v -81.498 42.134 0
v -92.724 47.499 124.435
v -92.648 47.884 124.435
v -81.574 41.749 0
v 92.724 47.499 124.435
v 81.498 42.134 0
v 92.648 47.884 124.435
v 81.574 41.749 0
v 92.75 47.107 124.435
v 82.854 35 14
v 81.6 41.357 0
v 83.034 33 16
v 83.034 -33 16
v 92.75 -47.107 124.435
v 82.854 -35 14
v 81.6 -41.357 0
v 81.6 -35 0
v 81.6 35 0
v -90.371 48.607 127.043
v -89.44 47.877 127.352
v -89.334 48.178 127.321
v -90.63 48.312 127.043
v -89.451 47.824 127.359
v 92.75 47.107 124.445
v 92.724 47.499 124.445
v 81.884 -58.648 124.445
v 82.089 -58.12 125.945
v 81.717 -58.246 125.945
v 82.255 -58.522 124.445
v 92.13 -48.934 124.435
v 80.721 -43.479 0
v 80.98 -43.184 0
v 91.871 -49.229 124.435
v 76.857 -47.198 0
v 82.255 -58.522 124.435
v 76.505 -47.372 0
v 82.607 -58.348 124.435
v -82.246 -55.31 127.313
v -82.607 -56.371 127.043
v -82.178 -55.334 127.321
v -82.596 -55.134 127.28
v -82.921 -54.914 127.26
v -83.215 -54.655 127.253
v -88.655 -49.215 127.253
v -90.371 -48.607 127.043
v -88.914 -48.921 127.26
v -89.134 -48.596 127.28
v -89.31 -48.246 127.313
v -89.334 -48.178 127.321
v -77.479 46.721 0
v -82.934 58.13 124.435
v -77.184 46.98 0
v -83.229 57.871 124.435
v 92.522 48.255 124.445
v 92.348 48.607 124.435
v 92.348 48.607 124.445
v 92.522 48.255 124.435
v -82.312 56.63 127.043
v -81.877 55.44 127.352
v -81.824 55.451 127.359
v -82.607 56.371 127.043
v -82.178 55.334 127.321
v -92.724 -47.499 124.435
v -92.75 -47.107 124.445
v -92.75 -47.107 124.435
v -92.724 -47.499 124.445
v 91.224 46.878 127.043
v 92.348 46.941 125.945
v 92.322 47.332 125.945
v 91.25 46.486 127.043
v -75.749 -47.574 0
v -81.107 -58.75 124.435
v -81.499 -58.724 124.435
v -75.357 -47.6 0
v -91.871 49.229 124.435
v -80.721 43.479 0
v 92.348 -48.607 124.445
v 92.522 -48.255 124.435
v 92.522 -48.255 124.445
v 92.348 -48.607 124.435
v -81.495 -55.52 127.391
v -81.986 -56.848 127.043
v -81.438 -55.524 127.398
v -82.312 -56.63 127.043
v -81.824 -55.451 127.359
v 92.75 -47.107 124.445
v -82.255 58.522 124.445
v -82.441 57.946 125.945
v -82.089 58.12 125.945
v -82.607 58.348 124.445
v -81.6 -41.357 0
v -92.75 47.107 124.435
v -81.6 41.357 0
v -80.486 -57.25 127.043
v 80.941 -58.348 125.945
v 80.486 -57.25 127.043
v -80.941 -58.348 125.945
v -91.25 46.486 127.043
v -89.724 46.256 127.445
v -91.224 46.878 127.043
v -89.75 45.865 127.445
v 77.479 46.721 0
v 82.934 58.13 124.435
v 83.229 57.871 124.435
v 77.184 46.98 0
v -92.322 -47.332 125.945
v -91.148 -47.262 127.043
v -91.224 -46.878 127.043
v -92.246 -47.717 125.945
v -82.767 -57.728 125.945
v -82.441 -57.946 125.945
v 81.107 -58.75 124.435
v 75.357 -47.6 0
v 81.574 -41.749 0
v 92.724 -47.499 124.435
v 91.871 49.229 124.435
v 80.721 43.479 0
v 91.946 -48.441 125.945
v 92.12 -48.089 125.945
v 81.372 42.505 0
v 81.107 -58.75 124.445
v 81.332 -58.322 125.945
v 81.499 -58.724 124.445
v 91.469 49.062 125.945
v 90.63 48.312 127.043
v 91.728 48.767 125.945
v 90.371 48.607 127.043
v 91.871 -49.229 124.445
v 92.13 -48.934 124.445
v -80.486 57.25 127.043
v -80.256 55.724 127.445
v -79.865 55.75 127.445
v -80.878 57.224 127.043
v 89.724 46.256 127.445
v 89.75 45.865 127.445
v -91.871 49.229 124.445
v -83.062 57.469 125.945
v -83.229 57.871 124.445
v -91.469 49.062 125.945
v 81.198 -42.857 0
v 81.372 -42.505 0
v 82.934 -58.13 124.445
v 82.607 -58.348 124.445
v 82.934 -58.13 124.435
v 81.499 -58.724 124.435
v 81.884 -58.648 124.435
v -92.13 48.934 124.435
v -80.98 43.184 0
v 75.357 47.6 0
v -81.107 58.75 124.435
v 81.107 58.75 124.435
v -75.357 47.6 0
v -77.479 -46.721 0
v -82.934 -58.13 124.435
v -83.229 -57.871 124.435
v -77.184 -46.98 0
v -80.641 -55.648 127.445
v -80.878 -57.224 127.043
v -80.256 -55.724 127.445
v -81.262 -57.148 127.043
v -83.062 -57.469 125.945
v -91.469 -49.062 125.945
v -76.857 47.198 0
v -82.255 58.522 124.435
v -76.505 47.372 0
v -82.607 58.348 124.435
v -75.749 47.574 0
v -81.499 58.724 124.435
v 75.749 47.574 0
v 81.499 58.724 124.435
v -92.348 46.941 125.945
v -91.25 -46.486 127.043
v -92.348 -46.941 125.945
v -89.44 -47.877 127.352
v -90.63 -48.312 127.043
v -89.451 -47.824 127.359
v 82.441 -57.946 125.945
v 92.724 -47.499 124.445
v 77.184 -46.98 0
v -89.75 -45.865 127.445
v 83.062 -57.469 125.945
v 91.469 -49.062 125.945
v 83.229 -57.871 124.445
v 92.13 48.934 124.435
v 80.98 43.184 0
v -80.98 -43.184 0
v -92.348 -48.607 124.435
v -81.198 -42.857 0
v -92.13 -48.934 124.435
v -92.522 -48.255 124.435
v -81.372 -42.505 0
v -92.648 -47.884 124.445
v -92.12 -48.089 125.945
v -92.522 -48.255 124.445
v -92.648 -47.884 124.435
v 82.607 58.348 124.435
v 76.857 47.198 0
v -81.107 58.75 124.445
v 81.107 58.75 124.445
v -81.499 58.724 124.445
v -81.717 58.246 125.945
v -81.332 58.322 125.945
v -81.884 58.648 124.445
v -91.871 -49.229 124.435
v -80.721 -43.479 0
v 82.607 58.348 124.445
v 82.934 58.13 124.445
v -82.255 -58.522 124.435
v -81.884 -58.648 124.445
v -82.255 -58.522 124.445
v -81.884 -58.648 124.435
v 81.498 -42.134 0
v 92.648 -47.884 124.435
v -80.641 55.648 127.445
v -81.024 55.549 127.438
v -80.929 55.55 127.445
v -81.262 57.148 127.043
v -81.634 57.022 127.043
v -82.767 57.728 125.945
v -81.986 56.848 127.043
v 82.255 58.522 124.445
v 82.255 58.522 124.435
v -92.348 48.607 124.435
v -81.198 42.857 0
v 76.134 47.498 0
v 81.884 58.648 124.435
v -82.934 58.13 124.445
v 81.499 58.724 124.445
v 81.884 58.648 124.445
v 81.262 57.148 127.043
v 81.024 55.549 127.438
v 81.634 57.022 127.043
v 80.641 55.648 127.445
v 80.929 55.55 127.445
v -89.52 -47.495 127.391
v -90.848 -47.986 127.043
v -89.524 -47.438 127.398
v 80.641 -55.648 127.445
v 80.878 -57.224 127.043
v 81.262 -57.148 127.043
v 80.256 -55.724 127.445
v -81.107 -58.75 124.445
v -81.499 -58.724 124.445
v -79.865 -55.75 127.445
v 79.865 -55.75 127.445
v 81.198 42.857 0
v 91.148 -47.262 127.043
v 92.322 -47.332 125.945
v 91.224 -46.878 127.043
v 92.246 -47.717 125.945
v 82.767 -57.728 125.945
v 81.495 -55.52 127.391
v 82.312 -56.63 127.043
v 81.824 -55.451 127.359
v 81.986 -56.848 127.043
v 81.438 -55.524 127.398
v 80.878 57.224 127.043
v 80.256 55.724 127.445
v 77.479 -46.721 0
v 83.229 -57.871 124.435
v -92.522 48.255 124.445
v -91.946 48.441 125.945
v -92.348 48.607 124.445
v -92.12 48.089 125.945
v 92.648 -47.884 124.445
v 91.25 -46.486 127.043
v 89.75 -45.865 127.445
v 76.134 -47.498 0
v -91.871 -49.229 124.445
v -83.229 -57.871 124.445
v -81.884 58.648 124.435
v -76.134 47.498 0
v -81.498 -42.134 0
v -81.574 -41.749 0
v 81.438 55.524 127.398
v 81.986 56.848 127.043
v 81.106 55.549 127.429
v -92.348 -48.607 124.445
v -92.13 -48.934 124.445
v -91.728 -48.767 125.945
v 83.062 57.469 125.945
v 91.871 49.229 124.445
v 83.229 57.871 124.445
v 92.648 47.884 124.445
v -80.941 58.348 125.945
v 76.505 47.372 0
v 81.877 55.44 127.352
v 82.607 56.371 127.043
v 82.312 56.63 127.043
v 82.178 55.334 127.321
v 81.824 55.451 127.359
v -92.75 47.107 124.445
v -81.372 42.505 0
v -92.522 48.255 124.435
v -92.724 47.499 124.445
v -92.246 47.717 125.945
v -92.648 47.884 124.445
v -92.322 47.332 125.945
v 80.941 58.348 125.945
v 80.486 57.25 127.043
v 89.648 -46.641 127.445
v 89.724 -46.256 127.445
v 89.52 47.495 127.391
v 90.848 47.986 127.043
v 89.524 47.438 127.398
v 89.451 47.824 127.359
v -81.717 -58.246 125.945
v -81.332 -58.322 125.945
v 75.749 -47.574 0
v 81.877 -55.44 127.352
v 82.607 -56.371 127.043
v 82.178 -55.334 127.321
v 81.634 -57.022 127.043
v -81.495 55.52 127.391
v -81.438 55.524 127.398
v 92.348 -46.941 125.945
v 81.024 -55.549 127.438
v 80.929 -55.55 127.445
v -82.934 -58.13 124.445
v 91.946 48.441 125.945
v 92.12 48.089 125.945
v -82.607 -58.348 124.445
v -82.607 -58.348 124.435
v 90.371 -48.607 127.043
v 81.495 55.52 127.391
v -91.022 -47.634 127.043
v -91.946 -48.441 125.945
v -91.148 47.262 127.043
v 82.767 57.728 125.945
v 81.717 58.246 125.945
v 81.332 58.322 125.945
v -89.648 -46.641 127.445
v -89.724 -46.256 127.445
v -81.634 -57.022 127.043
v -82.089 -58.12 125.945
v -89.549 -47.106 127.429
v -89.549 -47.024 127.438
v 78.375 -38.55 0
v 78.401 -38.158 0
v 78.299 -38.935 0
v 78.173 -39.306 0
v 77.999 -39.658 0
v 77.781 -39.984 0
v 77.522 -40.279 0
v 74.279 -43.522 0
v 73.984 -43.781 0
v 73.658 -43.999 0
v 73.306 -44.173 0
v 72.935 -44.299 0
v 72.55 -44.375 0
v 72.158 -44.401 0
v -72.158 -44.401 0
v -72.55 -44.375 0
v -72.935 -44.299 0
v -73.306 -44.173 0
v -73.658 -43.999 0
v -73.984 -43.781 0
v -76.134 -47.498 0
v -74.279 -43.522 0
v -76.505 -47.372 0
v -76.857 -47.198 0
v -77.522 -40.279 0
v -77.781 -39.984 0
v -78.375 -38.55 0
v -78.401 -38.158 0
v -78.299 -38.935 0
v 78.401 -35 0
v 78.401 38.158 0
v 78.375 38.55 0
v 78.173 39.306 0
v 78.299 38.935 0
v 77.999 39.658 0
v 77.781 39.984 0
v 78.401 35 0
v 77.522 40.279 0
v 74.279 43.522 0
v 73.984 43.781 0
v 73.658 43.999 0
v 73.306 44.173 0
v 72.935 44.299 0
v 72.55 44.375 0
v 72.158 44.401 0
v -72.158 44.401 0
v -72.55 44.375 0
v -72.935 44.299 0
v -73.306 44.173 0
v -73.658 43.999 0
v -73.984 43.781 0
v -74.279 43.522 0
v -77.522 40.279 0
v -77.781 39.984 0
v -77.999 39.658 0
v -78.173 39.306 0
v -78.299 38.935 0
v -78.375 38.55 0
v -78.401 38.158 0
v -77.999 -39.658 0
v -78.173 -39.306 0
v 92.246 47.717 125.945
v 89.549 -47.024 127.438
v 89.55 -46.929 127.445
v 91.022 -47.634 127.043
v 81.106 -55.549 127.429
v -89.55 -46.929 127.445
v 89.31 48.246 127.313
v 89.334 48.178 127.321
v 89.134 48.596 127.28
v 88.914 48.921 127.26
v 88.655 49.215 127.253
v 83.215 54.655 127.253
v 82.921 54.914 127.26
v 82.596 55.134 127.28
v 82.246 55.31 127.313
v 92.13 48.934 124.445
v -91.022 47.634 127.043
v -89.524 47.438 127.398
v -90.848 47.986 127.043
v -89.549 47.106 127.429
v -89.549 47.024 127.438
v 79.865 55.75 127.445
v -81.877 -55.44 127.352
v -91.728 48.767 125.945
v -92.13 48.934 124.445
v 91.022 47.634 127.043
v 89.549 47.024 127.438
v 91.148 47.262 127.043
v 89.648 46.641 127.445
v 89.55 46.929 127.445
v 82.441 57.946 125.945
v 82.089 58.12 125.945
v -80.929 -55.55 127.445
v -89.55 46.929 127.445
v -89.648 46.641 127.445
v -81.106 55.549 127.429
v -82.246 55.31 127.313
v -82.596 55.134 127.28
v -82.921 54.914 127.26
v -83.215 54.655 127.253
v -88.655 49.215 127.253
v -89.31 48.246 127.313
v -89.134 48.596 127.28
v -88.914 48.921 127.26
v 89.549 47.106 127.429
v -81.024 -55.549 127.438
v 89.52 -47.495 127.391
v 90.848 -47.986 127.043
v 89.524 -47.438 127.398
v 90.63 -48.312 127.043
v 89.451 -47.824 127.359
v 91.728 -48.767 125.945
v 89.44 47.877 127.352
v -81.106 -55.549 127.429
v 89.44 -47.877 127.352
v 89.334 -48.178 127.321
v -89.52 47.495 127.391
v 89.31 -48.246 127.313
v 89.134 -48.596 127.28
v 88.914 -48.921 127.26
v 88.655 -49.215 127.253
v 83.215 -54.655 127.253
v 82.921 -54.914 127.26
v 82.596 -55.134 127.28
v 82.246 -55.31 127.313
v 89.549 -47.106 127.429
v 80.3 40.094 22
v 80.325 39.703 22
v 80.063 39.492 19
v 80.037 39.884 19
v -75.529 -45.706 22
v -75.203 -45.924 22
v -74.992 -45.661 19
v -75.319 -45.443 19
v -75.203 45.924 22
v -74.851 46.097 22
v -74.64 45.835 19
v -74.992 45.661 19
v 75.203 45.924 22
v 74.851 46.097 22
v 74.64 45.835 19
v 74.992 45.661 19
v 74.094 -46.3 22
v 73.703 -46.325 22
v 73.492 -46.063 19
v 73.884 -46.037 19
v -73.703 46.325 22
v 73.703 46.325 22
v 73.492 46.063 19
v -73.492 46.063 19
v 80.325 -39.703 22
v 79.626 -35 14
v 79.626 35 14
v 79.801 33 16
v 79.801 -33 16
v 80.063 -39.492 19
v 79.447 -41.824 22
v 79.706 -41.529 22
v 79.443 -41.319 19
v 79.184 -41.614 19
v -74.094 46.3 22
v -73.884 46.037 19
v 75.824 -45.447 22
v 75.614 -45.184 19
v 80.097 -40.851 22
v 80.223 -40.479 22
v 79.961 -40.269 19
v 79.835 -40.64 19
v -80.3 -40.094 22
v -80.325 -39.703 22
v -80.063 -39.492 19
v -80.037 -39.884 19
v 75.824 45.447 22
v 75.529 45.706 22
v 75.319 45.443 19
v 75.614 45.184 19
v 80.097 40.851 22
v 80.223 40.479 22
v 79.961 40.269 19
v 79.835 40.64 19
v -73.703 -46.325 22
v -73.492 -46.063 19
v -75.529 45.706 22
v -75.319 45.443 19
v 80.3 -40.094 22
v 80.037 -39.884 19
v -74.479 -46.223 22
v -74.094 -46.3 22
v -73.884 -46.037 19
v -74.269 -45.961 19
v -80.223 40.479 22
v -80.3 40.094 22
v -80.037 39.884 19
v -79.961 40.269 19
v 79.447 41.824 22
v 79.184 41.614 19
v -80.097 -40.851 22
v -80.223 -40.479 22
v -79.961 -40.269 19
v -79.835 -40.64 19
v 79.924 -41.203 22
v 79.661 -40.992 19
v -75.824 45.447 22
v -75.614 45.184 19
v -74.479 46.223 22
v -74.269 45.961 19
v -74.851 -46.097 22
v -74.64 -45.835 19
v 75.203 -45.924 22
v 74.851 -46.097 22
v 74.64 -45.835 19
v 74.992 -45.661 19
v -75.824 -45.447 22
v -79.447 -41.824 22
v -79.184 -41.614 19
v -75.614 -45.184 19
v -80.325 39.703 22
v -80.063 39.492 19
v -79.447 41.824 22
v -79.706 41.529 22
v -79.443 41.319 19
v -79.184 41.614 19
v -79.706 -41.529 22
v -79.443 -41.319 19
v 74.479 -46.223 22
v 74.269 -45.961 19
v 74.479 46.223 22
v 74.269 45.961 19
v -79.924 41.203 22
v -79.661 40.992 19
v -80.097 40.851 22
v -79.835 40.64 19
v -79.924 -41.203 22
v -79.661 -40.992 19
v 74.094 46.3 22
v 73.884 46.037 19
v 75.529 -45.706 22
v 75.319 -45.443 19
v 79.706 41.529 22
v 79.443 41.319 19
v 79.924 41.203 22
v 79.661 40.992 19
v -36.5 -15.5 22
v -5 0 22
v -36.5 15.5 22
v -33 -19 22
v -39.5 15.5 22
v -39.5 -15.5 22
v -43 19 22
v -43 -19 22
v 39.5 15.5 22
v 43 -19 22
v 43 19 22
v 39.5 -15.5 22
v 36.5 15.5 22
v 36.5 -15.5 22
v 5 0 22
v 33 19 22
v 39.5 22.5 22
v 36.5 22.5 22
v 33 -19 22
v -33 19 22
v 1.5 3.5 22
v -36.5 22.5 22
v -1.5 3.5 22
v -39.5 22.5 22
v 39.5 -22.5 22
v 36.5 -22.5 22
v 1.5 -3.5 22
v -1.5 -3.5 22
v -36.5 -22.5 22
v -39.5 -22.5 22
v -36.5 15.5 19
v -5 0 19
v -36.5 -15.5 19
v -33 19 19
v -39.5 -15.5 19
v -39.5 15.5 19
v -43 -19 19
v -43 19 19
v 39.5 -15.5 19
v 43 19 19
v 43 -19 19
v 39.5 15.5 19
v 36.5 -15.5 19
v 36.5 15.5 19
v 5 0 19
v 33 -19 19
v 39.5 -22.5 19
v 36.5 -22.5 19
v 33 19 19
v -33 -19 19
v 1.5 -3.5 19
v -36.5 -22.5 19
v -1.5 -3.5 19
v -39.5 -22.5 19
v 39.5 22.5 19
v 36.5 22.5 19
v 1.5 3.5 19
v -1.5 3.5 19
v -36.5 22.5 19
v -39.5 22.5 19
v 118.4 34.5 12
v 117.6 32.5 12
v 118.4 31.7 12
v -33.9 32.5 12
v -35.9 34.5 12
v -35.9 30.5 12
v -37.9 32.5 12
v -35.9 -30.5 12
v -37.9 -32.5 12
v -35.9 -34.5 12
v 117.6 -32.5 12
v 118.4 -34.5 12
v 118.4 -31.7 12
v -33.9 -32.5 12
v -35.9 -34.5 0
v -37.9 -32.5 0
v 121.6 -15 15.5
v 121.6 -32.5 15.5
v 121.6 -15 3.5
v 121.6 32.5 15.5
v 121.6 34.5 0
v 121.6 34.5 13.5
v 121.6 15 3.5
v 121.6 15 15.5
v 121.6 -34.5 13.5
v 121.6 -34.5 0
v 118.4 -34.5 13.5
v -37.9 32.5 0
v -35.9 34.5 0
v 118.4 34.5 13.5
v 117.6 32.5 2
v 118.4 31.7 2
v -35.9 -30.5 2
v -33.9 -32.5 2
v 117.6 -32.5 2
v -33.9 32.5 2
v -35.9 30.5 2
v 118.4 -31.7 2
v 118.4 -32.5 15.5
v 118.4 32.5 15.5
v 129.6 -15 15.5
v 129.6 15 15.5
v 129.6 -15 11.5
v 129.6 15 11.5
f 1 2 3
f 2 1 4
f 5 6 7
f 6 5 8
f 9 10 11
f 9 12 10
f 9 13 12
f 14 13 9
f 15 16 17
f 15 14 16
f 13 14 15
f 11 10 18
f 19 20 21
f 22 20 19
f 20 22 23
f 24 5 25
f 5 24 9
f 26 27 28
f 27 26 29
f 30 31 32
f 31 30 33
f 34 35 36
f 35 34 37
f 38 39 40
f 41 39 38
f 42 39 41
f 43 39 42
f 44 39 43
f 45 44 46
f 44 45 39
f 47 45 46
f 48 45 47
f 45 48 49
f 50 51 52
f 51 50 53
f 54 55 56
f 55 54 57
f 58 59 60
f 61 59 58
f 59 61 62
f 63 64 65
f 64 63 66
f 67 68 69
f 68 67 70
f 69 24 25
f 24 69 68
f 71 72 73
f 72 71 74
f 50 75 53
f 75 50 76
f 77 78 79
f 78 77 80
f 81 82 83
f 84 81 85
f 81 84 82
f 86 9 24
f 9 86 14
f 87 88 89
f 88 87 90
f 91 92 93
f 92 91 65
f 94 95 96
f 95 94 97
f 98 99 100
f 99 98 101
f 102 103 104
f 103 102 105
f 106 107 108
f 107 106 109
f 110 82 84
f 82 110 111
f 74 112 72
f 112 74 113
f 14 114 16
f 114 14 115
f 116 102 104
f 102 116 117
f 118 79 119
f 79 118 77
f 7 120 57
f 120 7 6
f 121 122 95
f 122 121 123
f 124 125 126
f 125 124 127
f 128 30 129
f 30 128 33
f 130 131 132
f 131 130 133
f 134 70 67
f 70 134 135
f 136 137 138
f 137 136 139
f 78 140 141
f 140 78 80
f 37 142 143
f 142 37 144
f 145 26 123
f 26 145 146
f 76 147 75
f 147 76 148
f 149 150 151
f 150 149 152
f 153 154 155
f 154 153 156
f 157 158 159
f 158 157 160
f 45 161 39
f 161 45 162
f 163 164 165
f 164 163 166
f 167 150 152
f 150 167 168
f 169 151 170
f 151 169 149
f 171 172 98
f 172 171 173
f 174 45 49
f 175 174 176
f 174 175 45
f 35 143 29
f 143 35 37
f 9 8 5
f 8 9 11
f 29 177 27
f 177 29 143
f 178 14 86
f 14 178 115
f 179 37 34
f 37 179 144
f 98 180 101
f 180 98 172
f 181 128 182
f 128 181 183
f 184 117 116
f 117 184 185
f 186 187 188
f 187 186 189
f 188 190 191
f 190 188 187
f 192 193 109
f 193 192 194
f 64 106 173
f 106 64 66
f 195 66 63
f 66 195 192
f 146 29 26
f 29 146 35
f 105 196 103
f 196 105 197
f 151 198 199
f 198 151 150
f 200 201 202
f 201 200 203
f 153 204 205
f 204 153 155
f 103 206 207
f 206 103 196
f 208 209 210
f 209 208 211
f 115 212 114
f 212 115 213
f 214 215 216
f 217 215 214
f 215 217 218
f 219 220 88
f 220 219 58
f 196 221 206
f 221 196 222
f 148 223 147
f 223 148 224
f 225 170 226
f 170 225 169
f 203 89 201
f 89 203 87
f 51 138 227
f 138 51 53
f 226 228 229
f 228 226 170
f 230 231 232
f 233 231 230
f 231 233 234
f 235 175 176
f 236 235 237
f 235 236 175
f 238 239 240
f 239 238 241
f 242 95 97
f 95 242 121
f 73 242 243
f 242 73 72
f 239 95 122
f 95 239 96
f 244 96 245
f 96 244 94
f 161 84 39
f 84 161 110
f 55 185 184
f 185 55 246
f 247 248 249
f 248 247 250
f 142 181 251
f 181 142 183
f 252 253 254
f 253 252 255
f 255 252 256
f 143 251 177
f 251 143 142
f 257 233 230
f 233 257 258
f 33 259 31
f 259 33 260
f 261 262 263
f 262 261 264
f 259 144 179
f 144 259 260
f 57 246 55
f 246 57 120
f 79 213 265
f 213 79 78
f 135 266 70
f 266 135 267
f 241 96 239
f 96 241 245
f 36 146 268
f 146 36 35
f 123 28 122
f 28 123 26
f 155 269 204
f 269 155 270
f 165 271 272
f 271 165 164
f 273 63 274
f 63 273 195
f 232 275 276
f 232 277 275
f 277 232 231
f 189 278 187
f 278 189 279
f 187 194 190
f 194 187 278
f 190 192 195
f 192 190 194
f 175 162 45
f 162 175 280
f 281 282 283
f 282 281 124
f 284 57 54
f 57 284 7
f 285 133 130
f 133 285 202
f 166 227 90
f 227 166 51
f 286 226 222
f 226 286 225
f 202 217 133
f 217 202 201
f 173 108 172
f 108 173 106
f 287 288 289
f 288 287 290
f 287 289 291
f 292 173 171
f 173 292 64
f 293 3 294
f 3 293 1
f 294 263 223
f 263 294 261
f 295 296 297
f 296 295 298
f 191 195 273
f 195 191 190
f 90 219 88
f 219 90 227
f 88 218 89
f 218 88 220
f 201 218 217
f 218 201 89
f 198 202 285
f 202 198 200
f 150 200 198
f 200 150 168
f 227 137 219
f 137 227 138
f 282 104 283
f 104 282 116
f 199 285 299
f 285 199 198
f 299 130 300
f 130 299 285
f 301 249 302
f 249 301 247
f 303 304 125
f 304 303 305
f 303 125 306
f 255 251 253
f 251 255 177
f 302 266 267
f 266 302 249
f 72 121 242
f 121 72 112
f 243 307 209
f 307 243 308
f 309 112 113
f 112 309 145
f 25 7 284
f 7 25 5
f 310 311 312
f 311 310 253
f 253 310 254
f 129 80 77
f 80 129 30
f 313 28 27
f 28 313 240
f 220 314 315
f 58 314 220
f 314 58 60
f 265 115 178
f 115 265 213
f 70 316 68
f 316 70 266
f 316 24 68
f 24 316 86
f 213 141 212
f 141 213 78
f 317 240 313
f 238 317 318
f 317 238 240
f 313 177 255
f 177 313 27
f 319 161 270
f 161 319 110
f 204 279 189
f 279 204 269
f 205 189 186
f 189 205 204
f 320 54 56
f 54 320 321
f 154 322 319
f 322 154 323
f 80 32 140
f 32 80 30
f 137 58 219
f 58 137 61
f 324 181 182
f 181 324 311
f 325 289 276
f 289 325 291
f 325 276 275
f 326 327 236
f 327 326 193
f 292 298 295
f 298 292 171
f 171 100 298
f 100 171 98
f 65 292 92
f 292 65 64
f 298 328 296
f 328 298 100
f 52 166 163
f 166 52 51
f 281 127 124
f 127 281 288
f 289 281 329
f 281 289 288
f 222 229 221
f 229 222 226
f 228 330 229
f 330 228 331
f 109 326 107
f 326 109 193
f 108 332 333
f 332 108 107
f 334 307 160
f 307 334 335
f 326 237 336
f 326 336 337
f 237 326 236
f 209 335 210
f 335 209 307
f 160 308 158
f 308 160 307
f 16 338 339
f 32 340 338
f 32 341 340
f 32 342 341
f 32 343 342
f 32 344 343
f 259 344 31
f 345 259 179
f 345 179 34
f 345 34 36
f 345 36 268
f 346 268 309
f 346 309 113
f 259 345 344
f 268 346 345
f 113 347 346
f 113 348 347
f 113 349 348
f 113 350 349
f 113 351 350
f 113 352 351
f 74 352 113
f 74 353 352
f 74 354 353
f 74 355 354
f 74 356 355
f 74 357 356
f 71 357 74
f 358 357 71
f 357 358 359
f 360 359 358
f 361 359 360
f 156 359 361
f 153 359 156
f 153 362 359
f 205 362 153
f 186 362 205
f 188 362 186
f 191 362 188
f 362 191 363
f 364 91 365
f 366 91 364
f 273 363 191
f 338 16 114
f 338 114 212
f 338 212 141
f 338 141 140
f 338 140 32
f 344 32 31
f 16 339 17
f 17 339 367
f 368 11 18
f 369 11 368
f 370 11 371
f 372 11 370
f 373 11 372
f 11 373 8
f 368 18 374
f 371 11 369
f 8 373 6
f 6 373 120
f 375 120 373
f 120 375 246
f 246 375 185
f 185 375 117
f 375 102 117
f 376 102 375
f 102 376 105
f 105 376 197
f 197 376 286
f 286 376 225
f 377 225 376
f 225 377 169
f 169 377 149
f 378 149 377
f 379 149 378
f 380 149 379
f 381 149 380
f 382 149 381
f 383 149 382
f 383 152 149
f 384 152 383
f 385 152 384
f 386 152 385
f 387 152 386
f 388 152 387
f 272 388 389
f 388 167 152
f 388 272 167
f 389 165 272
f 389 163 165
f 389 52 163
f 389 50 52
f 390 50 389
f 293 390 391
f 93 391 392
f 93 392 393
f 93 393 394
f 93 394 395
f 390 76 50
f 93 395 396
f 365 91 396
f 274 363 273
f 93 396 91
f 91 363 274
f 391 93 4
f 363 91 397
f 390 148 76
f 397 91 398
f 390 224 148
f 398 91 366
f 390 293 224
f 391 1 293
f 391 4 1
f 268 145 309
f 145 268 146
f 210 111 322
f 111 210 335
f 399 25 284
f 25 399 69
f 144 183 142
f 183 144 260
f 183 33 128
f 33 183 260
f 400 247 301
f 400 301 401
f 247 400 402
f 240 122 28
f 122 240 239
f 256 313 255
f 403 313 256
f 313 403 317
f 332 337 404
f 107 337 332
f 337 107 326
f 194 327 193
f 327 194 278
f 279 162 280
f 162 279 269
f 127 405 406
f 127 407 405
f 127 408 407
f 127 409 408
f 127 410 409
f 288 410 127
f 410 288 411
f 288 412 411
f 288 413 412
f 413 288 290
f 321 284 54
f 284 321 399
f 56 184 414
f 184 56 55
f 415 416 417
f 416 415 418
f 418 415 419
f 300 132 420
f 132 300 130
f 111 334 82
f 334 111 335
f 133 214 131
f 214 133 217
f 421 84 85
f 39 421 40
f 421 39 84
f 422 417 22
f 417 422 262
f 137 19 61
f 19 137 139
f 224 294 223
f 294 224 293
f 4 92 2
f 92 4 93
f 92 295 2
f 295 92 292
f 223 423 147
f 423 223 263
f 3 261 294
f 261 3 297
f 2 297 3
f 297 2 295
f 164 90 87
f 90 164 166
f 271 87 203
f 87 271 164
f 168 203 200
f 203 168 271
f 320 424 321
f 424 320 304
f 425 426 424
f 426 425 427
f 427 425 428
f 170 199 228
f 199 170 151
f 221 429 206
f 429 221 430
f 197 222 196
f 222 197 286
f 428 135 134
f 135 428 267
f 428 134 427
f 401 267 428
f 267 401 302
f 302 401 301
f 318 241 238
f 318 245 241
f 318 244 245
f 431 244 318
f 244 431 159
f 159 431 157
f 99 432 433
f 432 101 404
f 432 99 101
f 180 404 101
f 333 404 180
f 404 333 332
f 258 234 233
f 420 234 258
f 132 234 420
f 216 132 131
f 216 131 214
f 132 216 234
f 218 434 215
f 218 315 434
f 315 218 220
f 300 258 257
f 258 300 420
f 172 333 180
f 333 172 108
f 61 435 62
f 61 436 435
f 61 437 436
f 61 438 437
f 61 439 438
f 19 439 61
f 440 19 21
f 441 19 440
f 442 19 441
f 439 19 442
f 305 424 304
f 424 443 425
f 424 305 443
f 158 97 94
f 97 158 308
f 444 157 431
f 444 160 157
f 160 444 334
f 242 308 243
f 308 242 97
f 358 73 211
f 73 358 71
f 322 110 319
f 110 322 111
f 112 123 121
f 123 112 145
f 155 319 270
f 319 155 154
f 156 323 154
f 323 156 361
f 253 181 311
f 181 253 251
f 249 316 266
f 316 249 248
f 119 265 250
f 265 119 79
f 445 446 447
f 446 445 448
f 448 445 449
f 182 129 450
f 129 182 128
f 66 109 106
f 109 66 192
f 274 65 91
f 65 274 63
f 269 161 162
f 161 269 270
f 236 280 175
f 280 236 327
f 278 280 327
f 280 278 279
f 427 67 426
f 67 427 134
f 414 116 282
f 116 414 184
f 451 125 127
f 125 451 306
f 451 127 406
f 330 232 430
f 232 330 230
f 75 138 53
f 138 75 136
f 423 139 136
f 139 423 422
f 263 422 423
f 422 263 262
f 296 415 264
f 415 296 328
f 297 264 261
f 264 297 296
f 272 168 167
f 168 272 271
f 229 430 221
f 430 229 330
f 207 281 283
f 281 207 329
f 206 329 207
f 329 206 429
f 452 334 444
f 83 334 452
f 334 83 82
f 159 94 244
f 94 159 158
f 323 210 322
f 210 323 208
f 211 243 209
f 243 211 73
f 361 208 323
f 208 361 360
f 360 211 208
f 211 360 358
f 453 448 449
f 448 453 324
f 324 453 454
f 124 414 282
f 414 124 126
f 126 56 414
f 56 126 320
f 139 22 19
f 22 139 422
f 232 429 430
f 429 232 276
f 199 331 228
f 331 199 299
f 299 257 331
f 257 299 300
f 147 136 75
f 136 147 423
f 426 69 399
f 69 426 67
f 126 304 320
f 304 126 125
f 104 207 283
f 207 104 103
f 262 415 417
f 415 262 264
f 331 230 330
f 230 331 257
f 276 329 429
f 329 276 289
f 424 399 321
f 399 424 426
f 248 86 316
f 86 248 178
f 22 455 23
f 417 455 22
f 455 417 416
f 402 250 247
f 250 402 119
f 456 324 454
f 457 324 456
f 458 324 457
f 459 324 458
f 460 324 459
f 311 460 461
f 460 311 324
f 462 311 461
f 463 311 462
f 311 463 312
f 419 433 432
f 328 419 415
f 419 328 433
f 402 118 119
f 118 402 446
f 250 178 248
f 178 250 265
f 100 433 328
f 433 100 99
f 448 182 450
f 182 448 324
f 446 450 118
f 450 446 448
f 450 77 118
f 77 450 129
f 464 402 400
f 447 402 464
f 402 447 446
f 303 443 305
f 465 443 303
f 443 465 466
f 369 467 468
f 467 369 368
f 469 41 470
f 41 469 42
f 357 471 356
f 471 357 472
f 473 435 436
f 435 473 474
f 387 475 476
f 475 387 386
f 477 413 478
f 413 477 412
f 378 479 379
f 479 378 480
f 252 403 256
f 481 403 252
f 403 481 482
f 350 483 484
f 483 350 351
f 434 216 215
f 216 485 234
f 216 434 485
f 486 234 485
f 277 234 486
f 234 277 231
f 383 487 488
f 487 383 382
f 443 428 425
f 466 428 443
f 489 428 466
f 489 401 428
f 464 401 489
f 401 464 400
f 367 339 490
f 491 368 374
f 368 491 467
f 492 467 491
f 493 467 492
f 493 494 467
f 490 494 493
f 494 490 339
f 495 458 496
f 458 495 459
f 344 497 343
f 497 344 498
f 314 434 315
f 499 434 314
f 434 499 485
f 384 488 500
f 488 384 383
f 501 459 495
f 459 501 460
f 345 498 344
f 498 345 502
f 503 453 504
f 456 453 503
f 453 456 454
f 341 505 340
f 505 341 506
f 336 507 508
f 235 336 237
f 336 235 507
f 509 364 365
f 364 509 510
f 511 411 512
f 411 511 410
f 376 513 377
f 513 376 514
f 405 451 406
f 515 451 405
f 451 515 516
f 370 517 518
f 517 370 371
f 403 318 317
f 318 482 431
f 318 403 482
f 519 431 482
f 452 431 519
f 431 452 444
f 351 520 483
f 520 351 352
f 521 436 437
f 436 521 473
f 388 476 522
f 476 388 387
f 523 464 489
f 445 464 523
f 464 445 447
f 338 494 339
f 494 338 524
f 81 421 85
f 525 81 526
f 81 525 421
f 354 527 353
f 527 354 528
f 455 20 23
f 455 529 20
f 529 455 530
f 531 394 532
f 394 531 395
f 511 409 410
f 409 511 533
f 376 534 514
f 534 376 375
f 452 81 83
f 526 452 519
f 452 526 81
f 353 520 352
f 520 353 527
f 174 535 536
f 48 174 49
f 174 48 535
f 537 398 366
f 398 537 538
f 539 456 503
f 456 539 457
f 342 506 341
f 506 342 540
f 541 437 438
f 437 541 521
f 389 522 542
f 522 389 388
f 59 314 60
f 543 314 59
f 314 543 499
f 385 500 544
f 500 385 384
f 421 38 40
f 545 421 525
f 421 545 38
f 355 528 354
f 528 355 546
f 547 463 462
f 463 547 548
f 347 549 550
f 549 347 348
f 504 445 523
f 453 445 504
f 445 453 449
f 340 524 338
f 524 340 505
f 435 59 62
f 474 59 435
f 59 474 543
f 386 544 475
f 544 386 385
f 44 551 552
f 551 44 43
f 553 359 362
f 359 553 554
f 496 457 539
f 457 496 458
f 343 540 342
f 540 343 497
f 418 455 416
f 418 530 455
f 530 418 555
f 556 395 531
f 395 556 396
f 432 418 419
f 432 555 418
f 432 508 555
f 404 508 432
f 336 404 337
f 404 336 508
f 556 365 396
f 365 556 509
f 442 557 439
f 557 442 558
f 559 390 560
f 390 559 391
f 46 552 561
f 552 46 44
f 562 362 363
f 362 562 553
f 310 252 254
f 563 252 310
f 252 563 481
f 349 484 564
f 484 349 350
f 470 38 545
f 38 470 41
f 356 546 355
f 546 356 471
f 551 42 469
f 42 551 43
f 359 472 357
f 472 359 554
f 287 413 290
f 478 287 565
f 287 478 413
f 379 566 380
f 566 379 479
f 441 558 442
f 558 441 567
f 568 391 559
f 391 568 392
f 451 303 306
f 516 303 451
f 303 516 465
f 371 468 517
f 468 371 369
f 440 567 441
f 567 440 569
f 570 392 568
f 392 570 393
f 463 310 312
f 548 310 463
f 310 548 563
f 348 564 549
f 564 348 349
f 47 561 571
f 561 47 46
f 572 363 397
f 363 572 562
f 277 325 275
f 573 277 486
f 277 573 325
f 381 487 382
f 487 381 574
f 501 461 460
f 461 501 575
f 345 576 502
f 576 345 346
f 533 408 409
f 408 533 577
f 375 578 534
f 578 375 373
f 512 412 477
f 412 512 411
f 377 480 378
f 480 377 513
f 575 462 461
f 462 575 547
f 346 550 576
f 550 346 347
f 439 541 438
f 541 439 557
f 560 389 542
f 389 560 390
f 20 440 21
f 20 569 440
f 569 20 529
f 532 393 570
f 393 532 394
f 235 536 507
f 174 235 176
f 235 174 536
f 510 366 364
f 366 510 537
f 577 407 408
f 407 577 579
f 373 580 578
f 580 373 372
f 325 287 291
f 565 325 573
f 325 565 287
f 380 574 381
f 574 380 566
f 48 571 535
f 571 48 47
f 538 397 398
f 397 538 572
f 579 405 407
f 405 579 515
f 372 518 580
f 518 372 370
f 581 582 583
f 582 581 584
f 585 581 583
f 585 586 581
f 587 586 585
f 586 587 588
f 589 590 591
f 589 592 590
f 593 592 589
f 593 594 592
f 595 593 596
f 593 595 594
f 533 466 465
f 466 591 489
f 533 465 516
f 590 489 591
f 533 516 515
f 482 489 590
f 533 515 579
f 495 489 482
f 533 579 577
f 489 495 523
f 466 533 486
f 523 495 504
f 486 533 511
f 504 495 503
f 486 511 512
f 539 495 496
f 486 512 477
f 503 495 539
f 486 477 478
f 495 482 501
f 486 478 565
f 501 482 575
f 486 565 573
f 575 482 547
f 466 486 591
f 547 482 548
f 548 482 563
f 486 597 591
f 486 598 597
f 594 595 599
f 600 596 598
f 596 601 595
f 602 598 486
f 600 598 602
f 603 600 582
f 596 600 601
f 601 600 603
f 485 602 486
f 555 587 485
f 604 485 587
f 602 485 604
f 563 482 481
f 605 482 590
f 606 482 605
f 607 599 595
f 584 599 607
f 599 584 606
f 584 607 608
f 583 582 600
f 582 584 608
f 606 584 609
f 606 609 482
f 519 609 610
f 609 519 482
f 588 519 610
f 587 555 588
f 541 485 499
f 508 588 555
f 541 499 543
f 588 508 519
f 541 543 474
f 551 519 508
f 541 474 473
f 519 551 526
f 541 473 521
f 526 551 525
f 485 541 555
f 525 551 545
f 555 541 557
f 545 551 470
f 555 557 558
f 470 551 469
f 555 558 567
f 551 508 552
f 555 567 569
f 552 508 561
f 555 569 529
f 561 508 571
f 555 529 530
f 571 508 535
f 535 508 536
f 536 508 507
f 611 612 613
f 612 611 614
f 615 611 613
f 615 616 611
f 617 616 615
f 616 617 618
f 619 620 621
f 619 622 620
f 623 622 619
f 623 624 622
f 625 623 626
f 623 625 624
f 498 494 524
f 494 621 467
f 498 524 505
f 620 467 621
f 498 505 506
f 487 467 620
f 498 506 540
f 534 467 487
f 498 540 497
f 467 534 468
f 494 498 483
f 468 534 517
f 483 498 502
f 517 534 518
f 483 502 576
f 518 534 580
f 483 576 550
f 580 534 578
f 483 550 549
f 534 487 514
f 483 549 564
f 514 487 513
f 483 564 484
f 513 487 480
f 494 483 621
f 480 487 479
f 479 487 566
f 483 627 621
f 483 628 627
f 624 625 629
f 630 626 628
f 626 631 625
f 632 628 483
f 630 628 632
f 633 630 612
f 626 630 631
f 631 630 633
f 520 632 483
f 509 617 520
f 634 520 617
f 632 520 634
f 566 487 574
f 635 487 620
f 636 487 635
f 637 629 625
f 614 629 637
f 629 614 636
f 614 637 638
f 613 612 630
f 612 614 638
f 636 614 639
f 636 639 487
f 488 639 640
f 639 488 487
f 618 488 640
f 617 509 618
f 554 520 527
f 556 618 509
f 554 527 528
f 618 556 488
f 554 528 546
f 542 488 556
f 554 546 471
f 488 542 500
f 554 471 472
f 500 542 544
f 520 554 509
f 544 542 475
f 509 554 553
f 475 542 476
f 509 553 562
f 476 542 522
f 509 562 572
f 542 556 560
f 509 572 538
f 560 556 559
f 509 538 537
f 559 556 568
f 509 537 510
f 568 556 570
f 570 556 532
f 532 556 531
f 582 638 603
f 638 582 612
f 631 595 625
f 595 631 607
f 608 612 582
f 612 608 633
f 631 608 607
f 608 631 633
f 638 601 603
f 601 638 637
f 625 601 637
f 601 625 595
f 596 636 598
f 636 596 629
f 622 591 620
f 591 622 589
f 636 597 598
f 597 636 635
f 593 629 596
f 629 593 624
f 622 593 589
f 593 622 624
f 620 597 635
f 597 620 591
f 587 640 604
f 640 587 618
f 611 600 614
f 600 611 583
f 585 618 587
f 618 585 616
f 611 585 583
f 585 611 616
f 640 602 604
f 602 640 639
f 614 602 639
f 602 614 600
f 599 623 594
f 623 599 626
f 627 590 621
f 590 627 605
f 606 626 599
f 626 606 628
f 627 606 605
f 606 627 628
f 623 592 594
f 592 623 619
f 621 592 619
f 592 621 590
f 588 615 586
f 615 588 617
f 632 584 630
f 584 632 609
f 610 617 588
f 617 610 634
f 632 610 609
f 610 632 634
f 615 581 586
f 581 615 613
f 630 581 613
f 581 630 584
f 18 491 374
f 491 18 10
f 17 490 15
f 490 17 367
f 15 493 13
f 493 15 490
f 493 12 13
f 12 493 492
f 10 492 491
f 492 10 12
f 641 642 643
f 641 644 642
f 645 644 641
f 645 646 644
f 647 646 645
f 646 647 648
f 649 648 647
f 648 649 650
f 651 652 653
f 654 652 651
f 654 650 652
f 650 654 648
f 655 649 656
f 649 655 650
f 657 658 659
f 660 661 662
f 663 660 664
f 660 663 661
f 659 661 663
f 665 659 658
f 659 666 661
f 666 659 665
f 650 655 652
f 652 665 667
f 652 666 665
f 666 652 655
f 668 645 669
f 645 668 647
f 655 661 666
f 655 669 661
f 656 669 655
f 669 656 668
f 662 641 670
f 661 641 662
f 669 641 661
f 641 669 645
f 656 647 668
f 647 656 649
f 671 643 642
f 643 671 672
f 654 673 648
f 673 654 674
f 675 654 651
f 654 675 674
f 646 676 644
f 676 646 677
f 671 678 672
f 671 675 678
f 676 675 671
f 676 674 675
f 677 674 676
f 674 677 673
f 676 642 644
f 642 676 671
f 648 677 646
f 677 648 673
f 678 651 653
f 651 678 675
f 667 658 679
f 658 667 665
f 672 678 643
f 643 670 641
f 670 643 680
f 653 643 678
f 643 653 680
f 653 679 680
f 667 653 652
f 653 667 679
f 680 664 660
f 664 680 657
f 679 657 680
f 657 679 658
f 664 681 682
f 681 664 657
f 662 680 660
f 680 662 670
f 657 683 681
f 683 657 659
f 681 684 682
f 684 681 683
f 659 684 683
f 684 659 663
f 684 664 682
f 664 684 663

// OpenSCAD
// Marsh repot liner — rebuilt from "Marsh repot - FIX flat rim setback.step"
// (two-body Fusion export, 2026-07-10) plus the user's section screenshots.
// Dimensions taken from per-body vertex extraction; see comments.
//
// TWO PARTS: set `part` to "pot", "tray", or "all" (assembly preview;
// `pullout` slides the tray out along +X for illustration).
//
// PRINT ORIENTATION (pot): on its BACK face — the +X end wall — rotated
// (90 - draft) about Y so that wall lies flat: 85deg at the current 5deg
// draft. Hanging tension then runs along layer planes [25]. The drawer
// slot lives in that same wall, so in use it faces the wall/shelf and
// the pot reads as an unbroken solid from the front and sides.
// The tray prints as modelled: flat on the bed, basin up.
//
// v014: hex band, struts, and captive drip tray REMOVED. The under-floor
//   bay is now a plain drawer bay: a slot_w x slot_h slot through the
//   back wall at ground level accepts a separate pull-out drip tray
//   (basin + face plate + pull lip) that slides on the shelf surface
//   under the 5 drainage holes. Visible only from the back. The face
//   plate fills the slot to 0.5mm clearance per side; the tray's front
//   edge meeting the far wall is the insertion stop, parking the face
//   ~flush with the back wall's ground-level plane (the wall's 5deg
//   draft means the wall face leans 1.4mm proud of the plate at the
//   slot's top edge). Slot top corners chamfered to match the pot's
//   45deg corner language; slot top sits 3mm below the pot floor so a
//   solid lintel band remains all the way around.
// v013: flat-rim setback REMOVED (a deliberate departure from the
//   original Fusion design this file was rebuilt from — the source file
//   was named for that feature). The wall now runs uniform 3.2mm
//   thickness to the top, capped by a 3mm outer roundover that sweeps
//   to within 0.2mm of the inner face. Same print cost as the corner
//   fillets: ~1mm under-curl band on the bed-end rim edge only.
// v012: rim outer edge rounded with rim_r = 1 (superseded by v013).
// v011: shell corners softened with the chamfer+fillet combo [10]: the
//   45deg chamfer core stays, its transition edges rounded by
//   corner_rf = 3. In the side print the surface exceeds 45deg only in
//   a ~0.9mm band along the two bed-side corner rails.
// v010: pot elongated in height until every wall is at a 5deg draft.
//   Footprints unchanged (rim 185.5x117.5, base 163.2x95.2);
//   height = 11.15/tan(5) = 127.44.
// v009: side-print audit fixes (hex drainage holes, 3.2mm walls, 45deg
//   shell corner chamfers). Drain hexes kept in v014.
// v008: band-to-tray attachment on struts (removed in v014 with band).
// v007: merged into one body (reverted in v014: two parts again).
// v006: exact geometry from the two-body export. Shell taper is LINEAR
//   rim-to-ground: outer 163.2x95.2 at Z0 to 185.5x117.5 at the rim
//   (skirt ring verts at Z=0: +-81.59 x +-47.59). Skirt is SOLID.
// v005: center tray + windowed ring (architecture right, details wrong).
// v004: 5x 8mm round drainage holes per horticultural guidance, kept
//   (as 10x7 hexes since v009).
// v002/v003: rim setback fix / open-tray rework (superseded).

part    = "all";   // "pot" | "tray" | "all"
pullout = 40;      // assembly preview only: tray drawn out along +X (mm)

$fn = 48;

// --- Shell: linear taper, ground to rim (per-body verts) ---
top_x   = 185.5;
top_y   = 117.5;
bot_x   = 163.2;   // skirt outer at Z=0 (+-81.59)
bot_y   = 95.2;    // (+-47.59)
draft   = 5;       // wall draft, degrees — all four walls
height  = (top_x - bot_x)/2 / tan(draft);   // 127.44 at 5deg
// One height can only set every wall to `draft` because both directions
// share the same half-difference; keep it that way.
assert(abs((top_x - bot_x) - (top_y - bot_y)) < 1e-6,
       "X and Y tapers differ; a single height cannot give one draft");
ch_top  = 10.4;    // 45deg corner chamfer at the rim
ch_bot  = 5;       // corner chamfer at the base
corner_rf = 3;     // fillet on the chamfer transition edges [10]; ~3mm
                   // is the ceiling before the bed-side rails droop
wall    = 3.2;     // 8x a 0.4mm extrusion line [1]

// --- Rim: uniform wall thickness to the top, rounded outer lip ---
rim_r = 3;   // top-edge roundover; on a 3.2 wall this sweeps to within
             // 0.2mm of the inner face (a near-full-width rounded lip)
assert(rim_r <= wall,
       "rim_r > wall: the roundover would undercut the inner face");

// --- Pot floor (STEP: bottom face Z=19, top ~22) ---
floor_bot = 19;
floor_top = 22;

// Drainage: 5 holes (v004 horticultural spec), hexagonal for the face
// print — pointed along pot-X so the points face print-vertical [3,4].
// 10x7 hex ~= 45mm2 open, matching the previous 8mm round hole.
drain_x  = 10;     // point-to-point, along pot-X
drain_y  = 7;      // across, along pot-Y
hole_pos = [[0, 0], [38, 19], [-38, 19], [38, -19], [-38, -19]];

// --- Drawer slot (back wall = +X end wall, the print-bed face) ---
slot_w   = 70;     // opening width, centered in Y
slot_h   = 16;     // opening height from the ground plane
slot_ch  = 2;      // 45deg chamfer on the slot's top corners
tray_clr = 0.5;    // per-side clearance, slot to tray
assert(slot_h <= floor_bot - 2,
       "slot_h too tall: keep a solid lintel band below the pot floor");
assert(slot_w/2 <= bot_y/2 - wall - ch_bot,
       "slot_w too wide: slot must stay in the flat of the back wall");

// --- Pull-out drip tray ---
tray_len   = 159.5;  // front edge stops 0.5 shy of the far wall when
                     // the face plate is flush with the back at Z0
tray_w     = slot_w - 2*tray_clr;   // 69
tray_wall  = 2;      // basin wall
tray_floor = 2;      // basin floor plate
tray_rim   = 12;     // basin wall height (passes the slot with 4mm air)
tray_ch    = 2;      // basin corner chamfer, in plan
face_t     = 3.2;    // face plate thickness (matches pot wall)
face_h     = slot_h - tray_clr;     // 15.5
lip_w      = 30;     // pull lip: bar across the face plate top,
lip_d      = 8;      //   protruding lip_d out the back,
lip_t      = 4;      //   lip_t thick, 45deg chamfer underneath [print]
assert(tray_rim < slot_h - tray_clr, "basin rim cannot pass the slot");
assert(face_h - lip_t - lip_d >= 0, "lip 45deg root runs off the plate");

back_x = bot_x/2;    // back wall outer plane at Z0 (the flush reference)
// Insertion stop: front edge meets the far wall inner face at Z0.
assert(back_x - tray_len > -(bot_x/2 - wall) - 0.51,
       "tray_len too long: front edge starts inside the far wall");

eps = 0.01;

// Chamfered-rectangle corner points, shared by the prism modules.
function cham_pts(x, y, ch) =
    [[-x/2 + ch, -y/2], [x/2 - ch, -y/2], [x/2, -y/2 + ch],
     [x/2,  y/2 - ch], [x/2 - ch,  y/2], [-x/2 + ch,  y/2],
     [-x/2,  y/2 - ch], [-x/2, -y/2 + ch]];

// Rectangle with sharp 45deg chamfered corners, extruded.
module hex_prism(x, y, h, ch) {
    linear_extrude(height = h) polygon(cham_pts(x, y, ch));
}

// Chamfer+fillet combo [10]: chamfered rectangle whose transition edges
// are rounded by rf (shrink, then round-offset back out). `inset`
// additionally shrinks the whole outline by a parallel offset — used to
// build the rim roundover slices.
module soft_prism(x, y, h, ch, rf, inset = 0) {
    linear_extrude(height = h)
        offset(r = rf) offset(delta = -rf - inset)
            polygon(cham_pts(x, y, ch));
}

// Outer shell with a rounded top edge: the hull's top is a stack of
// inset slices tracing a quarter-round of radius rim_r.
module outer_shell() {
    hull() {
        soft_prism(bot_x, bot_y, eps, ch_bot, corner_rf);
        for (t = [0, 30, 60, 90])
            translate([0, 0, height - rim_r + rim_r*sin(t) - eps])
                soft_prism(top_x, top_y, eps, ch_top, corner_rf,
                           inset = rim_r*(1 - cos(t)));
    }
}

// Tapered shell: hull of two soft prisms. The 45deg chamfer core prints
// from any orientation [9]; the rf-rounded transitions soften the look
// while confining >45deg surface to a sub-millimetre band in the face
// print (see the v011 note).
module shell(bx, by, tx, ty, h, cb, ct) {
    hull() {
        soft_prism(bx, by, eps, cb, corner_rf);
        translate([0, 0, h - eps]) soft_prism(tx, ty, eps, ct, corner_rf);
    }
}

// Drainage hexagon: pointed along pot-X (print-vertical when the floor
// prints as a vertical wall), 45deg point slopes, punched along pot-Z.
module drain_hole() {
    hu = drain_x/2; hv = drain_y/2; rise = hv;   // rise = hv -> 45deg
    linear_extrude(height = floor_top - floor_bot + 4, center = true)
        polygon([[-hu, 0], [-hu + rise, hv], [hu - rise, hv],
                 [hu, 0], [hu - rise, -hv], [-hu + rise, -hv]]);
}

function ox(z) = bot_x + (top_x - bot_x) * z / height;
function oy(z) = bot_y + (top_y - bot_y) * z / height;

module cavity() {
    translate([0, 0, -eps])
        shell(bot_x - 2*wall, bot_y - 2*wall,
              top_x - 2*wall, top_y - 2*wall,
              height + 2*eps, ch_bot, max(ch_top - wall, 1));
}

// Slot / face-plate profile in the Y-Z plane: flat bottom at `bot`,
// 45deg chamfers on the top two corners only (the bottom is the ground
// plane; the tray floor slides through it).
function slot_pts(w, h, ch, bot) =
    [[-w/2, bot], [w/2, bot], [w/2, h - ch], [w/2 - ch, h],
     [-w/2 + ch, h], [-w/2, h - ch]];

// Punch the drawer slot along +X through the back wall. The wall leans
// outward with height (5deg draft), so the cutter runs from inside the
// empty bay to well past the outer face at slot_h.
module slot_cut() {
    run = 10 + wall + slot_h*tan(draft) + 5;
    translate([back_x - 10, 0, 0])
        rotate([90, 0, 90])
            linear_extrude(height = run)
                polygon(slot_pts(slot_w, slot_h, slot_ch, -1));
}

// Drainage must drip inside the tray basin (checked against the basin's
// inner faces with the tray fully seated).
basin_in_y  = tray_w/2 - tray_wall;
basin_in_x0 = back_x - tray_len + tray_wall;   // front inner face
basin_in_x1 = back_x - face_t;                 // face-plate inner face
function holes_over_tray() =
    [for (p = hole_pos)
        assert(p[0] + drain_x/2 < basin_in_x1,
               str("hole at ", p, " past the tray face plate"))
        assert(p[0] - drain_x/2 > basin_in_x0,
               str("hole at ", p, " past the tray front wall"))
        assert(abs(p[1]) + drain_y/2 < basin_in_y,
               str("hole at ", p, " outside the tray basin in Y"))
        p];

module pot() {
    difference() {
        union() {
            // Shell: solid skirt, ground to rim, linear taper.
            difference() {
                outer_shell();
                cavity();
            }
            // Floor.
            intersection() {
                cavity();
                translate([0, 0, floor_bot])
                    hex_prism(ox(floor_top), oy(floor_top),
                              floor_top - floor_bot, ch_bot);
            }
        }

        // Drainage holes through the floor.
        for (p = holes_over_tray())
            translate([p[0], p[1], (floor_bot + floor_top)/2])
                drain_hole();

        // Drawer slot through the back wall.
        slot_cut();
    }
}

// Pull-out drip tray: basin + face plate + pull lip. Modelled seated
// (face plate at the back wall's Z0 plane); prints as-is, basin up.
module tray() {
    xc = back_x - tray_len/2;   // basin center
    union() {
        // Basin: uniform tray_wall walls on a tray_floor plate.
        difference() {
            translate([xc, 0, 0])
                hex_prism(tray_len, tray_w, tray_rim, tray_ch);
            translate([xc, 0, tray_floor])
                hex_prism(tray_len - 2*tray_wall, tray_w - 2*tray_wall,
                          tray_rim, tray_ch);
        }
        // Face plate: fills the slot minus clearance; overlaps the
        // basin's back wall for stiffness.
        translate([back_x - face_t, 0, 0])
            rotate([90, 0, 90])
                linear_extrude(height = face_t)
                    polygon(slot_pts(tray_w, face_h, slot_ch, 0));
        // Pull lip: bar across the face plate top, 45deg underside so
        // the tray prints flat with no supports.
        hull() {
            translate([back_x - eps, -lip_w/2, face_h - lip_t - lip_d])
                cube([eps, lip_w, lip_d + lip_t]);
            translate([back_x - eps, -lip_w/2, face_h - lip_t])
                cube([lip_d + eps, lip_w, lip_t]);
        }
    }
}

module main() {
    if (part == "pot" || part == "all") pot();
    if (part == "tray" || part == "all")
        translate([part == "all" ? pullout : 0, 0, 0]) tray();
}

if (is_list(holes_over_tray())) main();
